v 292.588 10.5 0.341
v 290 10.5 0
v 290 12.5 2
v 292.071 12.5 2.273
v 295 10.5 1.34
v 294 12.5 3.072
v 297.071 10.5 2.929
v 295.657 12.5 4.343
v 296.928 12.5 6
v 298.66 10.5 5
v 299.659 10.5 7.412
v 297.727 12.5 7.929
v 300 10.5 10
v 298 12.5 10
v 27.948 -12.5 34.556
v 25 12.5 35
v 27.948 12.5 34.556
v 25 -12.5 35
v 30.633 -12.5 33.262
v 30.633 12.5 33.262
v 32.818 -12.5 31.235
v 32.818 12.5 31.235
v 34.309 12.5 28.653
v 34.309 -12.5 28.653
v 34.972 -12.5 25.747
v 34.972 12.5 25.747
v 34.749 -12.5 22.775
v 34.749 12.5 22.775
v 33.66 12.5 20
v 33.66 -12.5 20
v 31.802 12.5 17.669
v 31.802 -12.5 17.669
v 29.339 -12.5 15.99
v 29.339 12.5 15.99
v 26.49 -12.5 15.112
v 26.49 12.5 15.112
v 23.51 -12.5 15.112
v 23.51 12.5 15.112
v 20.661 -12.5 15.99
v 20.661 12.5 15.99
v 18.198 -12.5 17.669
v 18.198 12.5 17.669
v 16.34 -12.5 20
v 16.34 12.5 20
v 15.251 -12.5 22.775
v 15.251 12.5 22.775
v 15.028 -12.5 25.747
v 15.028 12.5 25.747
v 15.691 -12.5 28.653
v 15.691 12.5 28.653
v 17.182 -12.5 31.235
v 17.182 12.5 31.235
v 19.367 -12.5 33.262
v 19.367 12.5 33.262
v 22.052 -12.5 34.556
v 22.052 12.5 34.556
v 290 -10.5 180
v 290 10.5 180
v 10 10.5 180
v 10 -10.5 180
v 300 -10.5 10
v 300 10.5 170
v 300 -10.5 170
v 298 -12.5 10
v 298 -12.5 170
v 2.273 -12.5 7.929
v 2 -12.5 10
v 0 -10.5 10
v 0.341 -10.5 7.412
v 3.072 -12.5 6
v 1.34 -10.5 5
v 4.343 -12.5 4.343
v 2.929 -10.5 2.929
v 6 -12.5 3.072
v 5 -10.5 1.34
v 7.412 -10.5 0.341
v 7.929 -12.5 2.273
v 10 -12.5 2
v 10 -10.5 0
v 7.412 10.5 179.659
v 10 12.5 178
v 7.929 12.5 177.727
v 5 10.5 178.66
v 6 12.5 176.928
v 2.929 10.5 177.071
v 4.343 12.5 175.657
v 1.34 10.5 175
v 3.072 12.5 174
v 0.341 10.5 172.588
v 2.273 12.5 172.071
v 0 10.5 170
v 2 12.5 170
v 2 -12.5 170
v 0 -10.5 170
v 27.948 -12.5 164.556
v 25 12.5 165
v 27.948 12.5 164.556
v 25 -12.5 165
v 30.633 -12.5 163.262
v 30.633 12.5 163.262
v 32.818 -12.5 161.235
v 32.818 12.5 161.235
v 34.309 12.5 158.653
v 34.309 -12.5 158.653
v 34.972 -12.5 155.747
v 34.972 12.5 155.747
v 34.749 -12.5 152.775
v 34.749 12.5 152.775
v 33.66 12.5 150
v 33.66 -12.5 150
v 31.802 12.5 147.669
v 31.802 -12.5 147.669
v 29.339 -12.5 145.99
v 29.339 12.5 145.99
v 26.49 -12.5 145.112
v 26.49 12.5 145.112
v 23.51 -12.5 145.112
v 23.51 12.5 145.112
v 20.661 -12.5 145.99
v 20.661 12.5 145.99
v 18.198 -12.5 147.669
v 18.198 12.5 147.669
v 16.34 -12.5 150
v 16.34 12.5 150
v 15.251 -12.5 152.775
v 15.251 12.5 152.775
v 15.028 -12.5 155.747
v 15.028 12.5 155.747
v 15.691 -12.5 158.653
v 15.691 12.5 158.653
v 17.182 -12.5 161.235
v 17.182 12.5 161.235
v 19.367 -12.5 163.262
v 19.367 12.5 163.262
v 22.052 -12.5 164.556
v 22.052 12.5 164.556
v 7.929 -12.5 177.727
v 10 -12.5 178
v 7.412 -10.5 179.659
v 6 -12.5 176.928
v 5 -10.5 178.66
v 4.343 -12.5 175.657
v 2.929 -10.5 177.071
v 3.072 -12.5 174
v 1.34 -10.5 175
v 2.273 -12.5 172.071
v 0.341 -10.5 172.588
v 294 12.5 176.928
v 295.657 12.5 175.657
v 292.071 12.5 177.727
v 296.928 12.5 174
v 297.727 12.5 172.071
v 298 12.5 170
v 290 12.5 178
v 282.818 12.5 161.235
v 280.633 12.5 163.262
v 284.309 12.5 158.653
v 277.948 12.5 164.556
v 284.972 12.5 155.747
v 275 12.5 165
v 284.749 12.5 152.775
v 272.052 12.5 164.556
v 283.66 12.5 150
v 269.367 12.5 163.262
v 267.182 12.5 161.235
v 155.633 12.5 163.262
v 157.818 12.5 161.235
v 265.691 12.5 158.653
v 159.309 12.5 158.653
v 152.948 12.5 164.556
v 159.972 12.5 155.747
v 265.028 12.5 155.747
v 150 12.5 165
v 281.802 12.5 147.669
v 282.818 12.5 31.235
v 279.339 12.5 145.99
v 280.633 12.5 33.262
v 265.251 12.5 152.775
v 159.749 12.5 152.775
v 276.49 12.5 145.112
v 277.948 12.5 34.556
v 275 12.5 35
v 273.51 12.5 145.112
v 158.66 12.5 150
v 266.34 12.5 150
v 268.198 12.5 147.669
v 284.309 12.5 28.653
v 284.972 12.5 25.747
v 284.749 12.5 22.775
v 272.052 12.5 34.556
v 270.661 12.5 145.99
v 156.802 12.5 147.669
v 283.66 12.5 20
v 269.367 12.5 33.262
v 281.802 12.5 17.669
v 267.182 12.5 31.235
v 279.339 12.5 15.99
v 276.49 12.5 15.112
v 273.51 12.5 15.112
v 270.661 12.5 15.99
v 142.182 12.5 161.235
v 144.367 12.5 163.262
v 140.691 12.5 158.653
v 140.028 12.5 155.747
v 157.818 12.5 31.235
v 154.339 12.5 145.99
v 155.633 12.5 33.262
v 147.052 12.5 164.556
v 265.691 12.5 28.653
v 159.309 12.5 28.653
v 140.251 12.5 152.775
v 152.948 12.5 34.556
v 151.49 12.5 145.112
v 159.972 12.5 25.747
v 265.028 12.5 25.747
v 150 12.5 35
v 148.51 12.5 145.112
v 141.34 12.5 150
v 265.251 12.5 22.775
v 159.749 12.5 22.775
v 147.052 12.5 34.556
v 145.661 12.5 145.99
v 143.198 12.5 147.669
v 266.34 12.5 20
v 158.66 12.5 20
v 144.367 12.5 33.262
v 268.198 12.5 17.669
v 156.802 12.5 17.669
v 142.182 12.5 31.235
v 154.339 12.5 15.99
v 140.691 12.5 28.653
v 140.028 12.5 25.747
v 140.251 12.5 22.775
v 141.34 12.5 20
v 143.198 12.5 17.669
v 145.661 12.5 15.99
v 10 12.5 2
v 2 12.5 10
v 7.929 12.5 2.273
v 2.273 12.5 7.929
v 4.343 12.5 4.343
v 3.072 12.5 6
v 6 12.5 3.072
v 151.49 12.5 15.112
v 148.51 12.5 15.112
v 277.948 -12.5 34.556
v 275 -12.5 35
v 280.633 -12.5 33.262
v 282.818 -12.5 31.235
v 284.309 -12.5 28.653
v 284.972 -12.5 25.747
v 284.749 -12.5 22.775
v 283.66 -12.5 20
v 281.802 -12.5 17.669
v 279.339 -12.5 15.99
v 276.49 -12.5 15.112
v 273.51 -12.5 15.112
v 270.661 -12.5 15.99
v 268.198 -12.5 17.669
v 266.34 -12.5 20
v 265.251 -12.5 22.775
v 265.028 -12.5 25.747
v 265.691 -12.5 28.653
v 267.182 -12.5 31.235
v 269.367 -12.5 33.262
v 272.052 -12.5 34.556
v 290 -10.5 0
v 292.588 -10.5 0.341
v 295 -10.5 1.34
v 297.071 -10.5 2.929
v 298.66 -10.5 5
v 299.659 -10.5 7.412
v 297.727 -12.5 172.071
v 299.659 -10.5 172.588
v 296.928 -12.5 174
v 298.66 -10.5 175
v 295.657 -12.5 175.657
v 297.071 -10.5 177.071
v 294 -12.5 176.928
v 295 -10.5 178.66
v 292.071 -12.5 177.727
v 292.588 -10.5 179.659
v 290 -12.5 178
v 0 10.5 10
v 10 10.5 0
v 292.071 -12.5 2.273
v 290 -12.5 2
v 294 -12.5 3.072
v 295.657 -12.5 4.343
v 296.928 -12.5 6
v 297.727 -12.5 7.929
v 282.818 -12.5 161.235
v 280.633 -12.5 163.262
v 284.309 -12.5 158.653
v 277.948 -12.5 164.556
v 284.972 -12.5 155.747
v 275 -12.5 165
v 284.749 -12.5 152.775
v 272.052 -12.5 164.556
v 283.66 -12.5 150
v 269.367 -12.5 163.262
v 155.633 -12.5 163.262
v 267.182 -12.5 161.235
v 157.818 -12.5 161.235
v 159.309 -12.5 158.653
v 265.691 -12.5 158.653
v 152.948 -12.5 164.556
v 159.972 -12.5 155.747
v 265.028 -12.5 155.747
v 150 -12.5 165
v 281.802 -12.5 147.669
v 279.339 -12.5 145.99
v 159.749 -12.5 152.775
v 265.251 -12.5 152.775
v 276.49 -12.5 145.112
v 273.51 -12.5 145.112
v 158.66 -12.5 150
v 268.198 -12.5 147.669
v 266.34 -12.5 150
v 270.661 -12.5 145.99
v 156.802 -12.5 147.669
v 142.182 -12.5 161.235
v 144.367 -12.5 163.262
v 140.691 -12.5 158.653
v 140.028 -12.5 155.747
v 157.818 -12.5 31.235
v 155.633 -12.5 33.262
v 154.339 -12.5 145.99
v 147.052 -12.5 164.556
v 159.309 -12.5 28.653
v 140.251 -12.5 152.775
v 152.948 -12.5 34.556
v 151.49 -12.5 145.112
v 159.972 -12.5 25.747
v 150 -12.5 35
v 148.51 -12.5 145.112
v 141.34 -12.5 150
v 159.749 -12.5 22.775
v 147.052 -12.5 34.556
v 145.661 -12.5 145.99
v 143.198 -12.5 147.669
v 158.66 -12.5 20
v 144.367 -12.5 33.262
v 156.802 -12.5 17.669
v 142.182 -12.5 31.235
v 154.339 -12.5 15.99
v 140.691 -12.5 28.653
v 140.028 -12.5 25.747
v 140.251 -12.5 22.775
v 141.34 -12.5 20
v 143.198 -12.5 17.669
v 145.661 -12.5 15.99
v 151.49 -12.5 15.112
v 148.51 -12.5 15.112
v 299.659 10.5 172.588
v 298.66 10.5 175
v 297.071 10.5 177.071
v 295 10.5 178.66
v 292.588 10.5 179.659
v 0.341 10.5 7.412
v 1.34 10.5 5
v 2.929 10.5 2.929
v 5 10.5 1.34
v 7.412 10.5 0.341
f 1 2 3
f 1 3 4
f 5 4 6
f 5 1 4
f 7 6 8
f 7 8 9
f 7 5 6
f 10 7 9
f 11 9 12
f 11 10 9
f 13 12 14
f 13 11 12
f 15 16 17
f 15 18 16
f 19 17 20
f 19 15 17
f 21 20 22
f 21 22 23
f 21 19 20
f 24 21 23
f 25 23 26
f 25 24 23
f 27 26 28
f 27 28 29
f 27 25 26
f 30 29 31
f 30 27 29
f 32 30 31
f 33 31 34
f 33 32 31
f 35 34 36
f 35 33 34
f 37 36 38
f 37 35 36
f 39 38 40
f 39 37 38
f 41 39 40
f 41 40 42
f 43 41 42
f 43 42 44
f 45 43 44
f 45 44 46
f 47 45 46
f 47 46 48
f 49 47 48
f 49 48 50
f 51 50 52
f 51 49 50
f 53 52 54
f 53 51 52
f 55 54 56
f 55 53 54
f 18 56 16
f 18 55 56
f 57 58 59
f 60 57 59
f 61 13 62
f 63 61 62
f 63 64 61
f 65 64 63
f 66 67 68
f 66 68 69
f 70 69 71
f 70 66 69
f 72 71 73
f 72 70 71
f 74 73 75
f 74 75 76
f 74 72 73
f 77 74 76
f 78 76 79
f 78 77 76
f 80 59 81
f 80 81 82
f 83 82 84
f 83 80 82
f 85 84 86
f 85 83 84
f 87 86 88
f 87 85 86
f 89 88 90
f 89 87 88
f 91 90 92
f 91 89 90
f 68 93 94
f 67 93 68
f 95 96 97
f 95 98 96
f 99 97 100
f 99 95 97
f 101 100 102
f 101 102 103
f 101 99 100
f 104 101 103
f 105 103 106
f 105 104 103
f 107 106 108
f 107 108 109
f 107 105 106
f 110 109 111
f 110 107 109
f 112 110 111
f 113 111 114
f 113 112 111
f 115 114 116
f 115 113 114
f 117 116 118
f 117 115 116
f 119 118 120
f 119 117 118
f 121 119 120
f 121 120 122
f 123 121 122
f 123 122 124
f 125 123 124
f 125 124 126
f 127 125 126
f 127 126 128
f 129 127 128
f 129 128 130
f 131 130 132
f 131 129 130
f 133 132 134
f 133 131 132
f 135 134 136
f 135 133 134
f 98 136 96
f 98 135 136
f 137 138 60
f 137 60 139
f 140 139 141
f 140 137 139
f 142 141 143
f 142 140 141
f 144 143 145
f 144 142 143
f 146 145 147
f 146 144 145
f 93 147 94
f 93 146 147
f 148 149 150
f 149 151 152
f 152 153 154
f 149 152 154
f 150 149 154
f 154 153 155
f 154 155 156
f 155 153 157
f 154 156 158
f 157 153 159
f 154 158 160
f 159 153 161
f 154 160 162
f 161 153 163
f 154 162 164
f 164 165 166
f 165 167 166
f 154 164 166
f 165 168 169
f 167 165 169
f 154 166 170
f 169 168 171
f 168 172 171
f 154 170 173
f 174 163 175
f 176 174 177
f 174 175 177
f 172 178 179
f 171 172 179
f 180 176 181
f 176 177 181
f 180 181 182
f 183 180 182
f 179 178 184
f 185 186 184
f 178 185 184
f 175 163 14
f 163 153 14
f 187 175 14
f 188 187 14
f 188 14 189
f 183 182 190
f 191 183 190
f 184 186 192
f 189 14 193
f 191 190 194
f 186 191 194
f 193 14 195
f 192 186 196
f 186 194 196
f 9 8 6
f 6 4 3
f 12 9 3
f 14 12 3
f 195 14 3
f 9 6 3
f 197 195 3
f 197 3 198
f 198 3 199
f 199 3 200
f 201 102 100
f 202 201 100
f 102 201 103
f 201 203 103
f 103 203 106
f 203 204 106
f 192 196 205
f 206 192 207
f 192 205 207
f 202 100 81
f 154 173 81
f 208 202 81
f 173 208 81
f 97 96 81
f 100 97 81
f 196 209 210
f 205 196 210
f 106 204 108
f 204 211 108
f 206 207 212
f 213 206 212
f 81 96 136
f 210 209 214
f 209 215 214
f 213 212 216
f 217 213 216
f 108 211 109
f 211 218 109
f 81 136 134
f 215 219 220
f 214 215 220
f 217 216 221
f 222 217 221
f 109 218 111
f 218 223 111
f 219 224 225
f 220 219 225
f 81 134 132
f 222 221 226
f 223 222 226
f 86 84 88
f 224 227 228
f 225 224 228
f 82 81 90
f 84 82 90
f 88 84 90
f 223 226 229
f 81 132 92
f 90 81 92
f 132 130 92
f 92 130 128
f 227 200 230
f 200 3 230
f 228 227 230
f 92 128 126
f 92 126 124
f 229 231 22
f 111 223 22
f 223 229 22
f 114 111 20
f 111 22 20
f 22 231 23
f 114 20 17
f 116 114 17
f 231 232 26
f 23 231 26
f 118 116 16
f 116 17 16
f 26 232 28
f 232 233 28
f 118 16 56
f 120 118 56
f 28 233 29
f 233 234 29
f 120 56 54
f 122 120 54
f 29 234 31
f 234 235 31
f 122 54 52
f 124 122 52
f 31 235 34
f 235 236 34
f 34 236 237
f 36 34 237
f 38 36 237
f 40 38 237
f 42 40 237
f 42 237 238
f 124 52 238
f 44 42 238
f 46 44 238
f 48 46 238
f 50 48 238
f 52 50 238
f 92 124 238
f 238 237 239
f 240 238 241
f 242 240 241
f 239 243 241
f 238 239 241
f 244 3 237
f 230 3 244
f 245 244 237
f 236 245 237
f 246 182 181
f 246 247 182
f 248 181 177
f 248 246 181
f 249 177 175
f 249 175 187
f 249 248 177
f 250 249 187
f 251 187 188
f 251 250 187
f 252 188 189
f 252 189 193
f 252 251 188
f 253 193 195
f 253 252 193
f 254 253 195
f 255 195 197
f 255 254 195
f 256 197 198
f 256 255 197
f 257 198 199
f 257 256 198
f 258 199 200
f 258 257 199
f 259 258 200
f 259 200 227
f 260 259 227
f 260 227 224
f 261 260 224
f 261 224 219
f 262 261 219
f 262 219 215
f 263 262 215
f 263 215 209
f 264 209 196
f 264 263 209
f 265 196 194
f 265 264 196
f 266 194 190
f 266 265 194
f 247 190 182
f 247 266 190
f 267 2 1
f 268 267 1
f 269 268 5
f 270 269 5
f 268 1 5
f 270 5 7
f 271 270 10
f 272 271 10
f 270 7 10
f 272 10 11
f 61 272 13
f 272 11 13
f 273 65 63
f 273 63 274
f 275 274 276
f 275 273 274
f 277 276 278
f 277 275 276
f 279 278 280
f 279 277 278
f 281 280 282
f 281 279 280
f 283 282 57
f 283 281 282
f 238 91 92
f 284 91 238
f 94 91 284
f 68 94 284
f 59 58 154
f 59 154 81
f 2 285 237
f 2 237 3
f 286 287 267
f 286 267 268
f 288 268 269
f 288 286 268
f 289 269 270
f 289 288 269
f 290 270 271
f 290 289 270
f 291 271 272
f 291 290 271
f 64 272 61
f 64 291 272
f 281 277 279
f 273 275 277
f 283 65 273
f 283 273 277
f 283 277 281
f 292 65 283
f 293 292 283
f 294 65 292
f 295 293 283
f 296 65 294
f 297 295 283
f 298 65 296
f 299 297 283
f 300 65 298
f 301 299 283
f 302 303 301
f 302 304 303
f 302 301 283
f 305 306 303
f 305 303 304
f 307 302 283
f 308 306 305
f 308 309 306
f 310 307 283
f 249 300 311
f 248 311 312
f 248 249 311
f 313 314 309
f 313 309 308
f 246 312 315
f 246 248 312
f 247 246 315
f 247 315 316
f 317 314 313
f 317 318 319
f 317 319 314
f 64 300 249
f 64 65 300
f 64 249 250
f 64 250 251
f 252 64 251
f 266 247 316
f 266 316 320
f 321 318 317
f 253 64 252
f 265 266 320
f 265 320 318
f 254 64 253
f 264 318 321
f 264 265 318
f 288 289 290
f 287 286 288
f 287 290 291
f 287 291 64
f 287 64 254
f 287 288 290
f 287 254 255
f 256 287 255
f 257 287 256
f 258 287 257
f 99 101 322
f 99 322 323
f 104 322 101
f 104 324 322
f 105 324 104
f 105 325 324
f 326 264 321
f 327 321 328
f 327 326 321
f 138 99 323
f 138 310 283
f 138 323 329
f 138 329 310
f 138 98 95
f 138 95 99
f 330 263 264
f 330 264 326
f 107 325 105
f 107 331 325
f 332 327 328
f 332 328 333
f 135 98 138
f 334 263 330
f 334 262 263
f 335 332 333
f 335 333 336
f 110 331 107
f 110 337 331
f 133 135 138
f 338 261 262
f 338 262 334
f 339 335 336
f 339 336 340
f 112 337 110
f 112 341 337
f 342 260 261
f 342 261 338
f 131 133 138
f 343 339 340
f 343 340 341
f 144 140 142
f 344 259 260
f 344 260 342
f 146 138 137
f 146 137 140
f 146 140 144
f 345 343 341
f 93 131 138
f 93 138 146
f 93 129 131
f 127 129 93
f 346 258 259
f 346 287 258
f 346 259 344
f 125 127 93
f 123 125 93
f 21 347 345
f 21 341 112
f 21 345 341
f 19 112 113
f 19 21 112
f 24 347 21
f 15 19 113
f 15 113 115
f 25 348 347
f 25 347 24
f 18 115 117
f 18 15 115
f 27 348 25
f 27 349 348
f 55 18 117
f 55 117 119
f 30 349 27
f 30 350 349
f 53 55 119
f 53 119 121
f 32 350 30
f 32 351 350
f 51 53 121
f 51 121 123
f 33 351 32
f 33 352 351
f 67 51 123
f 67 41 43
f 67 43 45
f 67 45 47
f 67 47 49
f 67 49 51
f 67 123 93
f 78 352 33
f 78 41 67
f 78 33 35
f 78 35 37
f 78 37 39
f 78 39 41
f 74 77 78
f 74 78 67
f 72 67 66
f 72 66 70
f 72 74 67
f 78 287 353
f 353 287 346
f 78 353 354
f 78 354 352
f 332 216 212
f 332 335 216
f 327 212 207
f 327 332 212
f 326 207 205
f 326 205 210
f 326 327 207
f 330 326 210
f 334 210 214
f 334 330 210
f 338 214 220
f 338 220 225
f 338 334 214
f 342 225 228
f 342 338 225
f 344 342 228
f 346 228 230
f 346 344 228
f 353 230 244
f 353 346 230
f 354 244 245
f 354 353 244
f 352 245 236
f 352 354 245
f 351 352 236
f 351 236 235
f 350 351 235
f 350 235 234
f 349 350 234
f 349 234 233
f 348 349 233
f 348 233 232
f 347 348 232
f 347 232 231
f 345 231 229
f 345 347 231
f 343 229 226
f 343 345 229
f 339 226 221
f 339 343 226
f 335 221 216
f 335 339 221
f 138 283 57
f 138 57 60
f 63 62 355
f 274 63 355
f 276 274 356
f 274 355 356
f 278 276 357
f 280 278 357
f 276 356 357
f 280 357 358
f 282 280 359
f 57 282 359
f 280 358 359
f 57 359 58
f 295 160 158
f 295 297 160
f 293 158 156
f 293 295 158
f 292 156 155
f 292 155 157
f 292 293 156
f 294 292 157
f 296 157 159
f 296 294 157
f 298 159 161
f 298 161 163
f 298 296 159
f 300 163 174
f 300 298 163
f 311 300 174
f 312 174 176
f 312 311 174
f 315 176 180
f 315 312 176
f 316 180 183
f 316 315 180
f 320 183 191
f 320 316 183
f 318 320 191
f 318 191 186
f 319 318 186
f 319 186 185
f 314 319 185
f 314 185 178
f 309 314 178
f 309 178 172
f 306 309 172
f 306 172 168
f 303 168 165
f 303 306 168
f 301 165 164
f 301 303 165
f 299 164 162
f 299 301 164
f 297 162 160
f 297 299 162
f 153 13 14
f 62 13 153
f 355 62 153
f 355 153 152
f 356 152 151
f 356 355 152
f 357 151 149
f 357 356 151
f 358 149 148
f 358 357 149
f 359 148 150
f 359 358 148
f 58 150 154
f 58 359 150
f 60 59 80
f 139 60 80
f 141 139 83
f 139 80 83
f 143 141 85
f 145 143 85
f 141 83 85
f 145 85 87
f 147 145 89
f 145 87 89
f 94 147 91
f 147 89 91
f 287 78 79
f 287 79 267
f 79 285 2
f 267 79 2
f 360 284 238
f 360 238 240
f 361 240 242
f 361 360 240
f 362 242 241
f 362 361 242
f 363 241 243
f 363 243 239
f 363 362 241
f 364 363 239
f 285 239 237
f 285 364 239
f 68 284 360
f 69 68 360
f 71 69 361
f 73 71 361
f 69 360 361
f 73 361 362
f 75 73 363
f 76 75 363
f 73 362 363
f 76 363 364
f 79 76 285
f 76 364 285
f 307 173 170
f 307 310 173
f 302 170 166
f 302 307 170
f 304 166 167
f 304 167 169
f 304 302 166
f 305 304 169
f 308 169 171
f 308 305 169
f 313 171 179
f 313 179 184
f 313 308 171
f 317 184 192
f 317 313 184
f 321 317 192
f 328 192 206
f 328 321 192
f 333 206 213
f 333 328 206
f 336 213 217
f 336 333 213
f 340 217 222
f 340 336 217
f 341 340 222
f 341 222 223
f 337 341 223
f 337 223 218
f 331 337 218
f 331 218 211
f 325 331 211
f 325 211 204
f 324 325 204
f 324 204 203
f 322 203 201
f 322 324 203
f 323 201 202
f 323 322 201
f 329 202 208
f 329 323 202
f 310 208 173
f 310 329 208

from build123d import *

# Parameters (mm, degrees)
SKETCH1_R           = 10
BOSS_EXTRUDE1_DEPTH = 12.5
CHAMFER1_SIZE       = 2


with BuildPart() as part:
    # Sketch1 → Boss-Extrude1 (new, symmetric)
    with BuildSketch(Plane(origin=(0, 0, 0), x_dir=(1, 0, 0), z_dir=(0, 1, 0))):
        with BuildLine():
            Line((10, 0), (290, 0))
            ThreePointArc((290, 0), (297.071067812, -2.928932188), (300, -10))
            Line((300, -10), (300, -170))
            ThreePointArc((300, -170), (297.071067812, -177.071067812), (290, -180))
            Line((290, -180), (10, -180))
            ThreePointArc((10, -180), (2.928932188, -177.071067812), (0, -170))
            Line((0, -170), (0, -10))
            ThreePointArc((0, -10), (2.928932188, -2.928932188), (10, 0))
        make_face()
        with Locations(Location((25, -25, 0), (0, 0, 270))):
            Circle(SKETCH1_R, mode=Mode.SUBTRACT)
        with Locations(Location((25, -155, 0), (0, 0, 270))):
            Circle(SKETCH1_R, mode=Mode.SUBTRACT)
        with Locations(Location((275, -25, 0), (0, 0, 270))):
            Circle(SKETCH1_R, mode=Mode.SUBTRACT)
        with Locations(Location((275, -155, 0), (0, 0, 270))):
            Circle(SKETCH1_R, mode=Mode.SUBTRACT)
        with Locations(Location((150, -25, 0), (0, 0, 270))):
            Circle(SKETCH1_R, mode=Mode.SUBTRACT)
        with Locations(Location((150, -155, 0), (0, 0, 270))):
            Circle(SKETCH1_R, mode=Mode.SUBTRACT)
    extrude(amount=BOSS_EXTRUDE1_DEPTH, both=True)

    # Chamfer1
    chamfer1_edges = [part.edges().sort_by_distance(p)[0] for p in [
        (150, -12.5, 0),
        (297.071067812, -12.5, 2.928932188),
        (300, -12.5, 90),
        (297.071067812, -12.5, 177.071067812),
        (297.071067812, 12.5, 2.928932188),
        (150, 12.5, 0),
        (2.928932188, 12.5, 2.928932188),
        (0, 12.5, 90),
        (2.928932188, 12.5, 177.071067812),
        (150, 12.5, 180),
        (297.071067812, 12.5, 177.071067812),
        (150, -12.5, 180),
        (300, 12.5, 90),
        (2.928932188, -12.5, 177.071067812),
        (0, -12.5, 90),
        (2.928932188, -12.5, 2.928932188),
    ]]
    chamfer(chamfer1_edges, length=CHAMFER1_SIZE)


solid = part.part
